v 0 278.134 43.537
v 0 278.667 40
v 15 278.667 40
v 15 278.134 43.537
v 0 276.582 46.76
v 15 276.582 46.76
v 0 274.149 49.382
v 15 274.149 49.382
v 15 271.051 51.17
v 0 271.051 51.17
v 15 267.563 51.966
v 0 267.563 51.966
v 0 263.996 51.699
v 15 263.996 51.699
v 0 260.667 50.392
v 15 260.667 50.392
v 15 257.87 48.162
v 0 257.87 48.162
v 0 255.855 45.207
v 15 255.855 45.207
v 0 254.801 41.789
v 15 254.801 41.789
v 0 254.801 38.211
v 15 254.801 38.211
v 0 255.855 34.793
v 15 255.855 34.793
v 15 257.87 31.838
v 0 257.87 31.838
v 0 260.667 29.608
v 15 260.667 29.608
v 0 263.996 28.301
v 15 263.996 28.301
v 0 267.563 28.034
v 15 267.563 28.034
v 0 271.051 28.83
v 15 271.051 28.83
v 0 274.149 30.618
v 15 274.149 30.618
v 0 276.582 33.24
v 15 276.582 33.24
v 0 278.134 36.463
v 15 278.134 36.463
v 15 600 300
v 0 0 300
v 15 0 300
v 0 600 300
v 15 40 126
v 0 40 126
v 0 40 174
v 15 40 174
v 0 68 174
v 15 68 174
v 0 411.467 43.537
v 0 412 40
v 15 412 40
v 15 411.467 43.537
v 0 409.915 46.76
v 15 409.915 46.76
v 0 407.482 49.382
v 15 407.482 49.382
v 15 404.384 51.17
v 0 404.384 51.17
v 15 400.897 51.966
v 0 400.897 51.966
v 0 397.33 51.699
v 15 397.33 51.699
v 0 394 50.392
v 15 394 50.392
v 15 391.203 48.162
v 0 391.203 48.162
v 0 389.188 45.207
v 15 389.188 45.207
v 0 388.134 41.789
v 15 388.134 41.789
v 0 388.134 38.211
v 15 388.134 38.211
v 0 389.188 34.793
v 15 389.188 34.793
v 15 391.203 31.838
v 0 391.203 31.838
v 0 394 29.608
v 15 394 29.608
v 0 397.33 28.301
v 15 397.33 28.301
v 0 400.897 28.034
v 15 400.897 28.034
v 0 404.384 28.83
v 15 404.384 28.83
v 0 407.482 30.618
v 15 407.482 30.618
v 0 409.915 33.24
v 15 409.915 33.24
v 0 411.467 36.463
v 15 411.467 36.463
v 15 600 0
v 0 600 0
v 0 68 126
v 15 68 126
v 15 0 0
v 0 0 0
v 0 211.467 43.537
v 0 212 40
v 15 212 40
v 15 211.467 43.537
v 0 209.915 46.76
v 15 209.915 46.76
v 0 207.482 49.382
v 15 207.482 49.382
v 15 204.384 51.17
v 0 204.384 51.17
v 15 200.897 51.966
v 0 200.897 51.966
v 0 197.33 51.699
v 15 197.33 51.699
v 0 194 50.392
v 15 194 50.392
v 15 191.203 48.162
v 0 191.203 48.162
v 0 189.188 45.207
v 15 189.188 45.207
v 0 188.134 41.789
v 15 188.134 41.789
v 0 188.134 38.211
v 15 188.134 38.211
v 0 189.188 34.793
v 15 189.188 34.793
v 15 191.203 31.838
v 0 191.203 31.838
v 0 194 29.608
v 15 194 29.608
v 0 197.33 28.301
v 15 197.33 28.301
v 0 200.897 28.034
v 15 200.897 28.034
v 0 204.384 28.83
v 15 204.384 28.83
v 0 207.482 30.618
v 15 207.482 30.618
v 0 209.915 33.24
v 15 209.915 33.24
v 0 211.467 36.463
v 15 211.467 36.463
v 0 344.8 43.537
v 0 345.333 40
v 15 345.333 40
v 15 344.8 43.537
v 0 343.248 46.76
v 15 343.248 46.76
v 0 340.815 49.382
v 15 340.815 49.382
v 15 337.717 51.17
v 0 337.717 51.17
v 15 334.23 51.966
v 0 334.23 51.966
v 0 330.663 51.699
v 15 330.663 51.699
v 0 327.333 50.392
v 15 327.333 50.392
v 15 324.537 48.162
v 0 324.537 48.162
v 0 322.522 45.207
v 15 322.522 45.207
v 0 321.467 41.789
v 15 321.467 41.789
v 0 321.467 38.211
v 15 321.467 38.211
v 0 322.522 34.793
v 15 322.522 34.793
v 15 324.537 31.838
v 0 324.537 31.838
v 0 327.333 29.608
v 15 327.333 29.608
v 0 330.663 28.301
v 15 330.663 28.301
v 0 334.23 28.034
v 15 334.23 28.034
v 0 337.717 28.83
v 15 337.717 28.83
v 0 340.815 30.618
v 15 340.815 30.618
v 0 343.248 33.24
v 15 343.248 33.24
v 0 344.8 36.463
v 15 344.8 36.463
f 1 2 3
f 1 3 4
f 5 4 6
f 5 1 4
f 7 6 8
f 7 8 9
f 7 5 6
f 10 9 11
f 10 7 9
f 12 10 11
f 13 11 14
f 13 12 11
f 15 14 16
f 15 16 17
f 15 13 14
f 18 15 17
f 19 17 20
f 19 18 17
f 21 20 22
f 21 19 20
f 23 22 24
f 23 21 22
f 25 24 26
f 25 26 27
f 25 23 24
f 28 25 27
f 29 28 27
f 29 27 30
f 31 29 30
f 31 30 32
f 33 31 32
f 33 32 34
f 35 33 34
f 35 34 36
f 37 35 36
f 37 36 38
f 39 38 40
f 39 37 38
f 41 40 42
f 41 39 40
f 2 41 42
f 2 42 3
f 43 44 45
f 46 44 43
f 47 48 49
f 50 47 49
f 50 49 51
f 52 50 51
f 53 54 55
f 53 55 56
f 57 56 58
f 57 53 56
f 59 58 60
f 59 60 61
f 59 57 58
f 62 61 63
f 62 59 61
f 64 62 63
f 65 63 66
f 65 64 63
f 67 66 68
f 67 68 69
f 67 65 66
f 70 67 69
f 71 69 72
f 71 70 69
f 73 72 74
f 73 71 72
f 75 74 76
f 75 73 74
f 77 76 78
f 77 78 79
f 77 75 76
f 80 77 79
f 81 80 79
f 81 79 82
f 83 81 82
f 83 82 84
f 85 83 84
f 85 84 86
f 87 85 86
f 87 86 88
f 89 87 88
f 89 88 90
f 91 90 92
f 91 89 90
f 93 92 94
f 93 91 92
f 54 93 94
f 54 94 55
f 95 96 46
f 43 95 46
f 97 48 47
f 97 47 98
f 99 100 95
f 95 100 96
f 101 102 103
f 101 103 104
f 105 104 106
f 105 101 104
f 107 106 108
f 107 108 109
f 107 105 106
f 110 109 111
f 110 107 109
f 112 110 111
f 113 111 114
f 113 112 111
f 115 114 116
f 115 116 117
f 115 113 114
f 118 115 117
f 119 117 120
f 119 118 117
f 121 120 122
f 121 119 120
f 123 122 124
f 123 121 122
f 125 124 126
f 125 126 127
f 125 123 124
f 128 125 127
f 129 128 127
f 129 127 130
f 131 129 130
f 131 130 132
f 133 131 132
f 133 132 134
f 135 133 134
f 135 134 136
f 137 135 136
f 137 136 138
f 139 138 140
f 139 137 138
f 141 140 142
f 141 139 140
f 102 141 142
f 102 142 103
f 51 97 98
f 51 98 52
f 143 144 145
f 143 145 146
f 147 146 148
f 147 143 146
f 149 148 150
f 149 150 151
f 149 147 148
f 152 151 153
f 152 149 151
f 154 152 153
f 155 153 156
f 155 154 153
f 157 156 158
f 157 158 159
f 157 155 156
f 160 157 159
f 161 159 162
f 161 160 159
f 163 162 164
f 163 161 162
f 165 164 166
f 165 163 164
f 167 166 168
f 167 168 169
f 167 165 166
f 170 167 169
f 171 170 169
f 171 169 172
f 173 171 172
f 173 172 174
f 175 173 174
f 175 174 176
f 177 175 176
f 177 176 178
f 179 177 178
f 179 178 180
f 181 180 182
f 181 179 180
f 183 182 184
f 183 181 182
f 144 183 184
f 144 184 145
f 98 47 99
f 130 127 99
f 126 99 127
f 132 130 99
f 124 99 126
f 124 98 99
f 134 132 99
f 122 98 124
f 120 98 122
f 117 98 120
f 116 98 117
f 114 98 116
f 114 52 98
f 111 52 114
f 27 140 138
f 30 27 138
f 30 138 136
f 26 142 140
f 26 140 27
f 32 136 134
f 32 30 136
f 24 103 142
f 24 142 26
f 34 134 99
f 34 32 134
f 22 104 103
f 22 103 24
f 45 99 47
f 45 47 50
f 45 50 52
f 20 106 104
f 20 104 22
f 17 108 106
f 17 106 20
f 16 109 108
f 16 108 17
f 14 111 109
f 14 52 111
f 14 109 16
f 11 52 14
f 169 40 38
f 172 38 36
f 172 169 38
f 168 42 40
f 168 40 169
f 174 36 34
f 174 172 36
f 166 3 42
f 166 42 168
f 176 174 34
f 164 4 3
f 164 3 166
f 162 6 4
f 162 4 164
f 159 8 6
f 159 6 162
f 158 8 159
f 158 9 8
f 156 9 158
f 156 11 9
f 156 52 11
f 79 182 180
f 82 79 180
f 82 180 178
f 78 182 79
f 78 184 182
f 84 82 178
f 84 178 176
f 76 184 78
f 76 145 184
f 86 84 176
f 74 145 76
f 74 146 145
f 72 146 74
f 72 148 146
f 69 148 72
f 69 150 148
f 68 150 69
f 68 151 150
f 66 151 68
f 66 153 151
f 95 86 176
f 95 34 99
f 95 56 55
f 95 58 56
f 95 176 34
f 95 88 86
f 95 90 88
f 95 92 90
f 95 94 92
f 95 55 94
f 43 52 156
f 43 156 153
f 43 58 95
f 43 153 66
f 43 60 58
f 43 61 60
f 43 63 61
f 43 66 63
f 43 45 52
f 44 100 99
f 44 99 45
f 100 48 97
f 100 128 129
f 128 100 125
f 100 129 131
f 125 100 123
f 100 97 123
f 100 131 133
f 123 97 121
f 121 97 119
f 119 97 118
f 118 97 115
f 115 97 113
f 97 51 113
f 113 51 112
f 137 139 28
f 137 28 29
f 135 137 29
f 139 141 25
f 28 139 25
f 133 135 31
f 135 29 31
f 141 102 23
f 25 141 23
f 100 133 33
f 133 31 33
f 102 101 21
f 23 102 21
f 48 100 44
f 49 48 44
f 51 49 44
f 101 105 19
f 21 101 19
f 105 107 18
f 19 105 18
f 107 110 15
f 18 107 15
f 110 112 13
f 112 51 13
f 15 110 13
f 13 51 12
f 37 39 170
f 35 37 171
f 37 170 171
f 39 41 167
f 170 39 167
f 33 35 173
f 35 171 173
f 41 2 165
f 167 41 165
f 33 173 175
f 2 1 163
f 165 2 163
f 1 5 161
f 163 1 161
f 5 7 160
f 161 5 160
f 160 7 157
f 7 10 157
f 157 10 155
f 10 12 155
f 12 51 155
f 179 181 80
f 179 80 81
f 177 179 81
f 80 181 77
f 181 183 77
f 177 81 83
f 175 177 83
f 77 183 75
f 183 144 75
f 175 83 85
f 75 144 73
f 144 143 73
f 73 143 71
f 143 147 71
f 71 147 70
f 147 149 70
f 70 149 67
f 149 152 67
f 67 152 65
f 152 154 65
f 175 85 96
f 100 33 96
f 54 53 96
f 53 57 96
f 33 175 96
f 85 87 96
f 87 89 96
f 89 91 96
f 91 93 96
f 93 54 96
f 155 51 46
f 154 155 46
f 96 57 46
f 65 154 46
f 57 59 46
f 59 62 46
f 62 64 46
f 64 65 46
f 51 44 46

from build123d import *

# Parameters (mm, degrees)
SKETCH_W   = 600
SKETCH_H   = 300
SKETCH_R   = 12
SKETCH_W_2 = 28
SKETCH_H_2 = 48
PAD_DEPTH  = 15


with BuildPart() as part:
    # Sketch → Pad (new body)
    with BuildSketch(Plane.YZ):
        with Locations((300, 150)):
            Rectangle(SKETCH_W, SKETCH_H)
        with Locations((200, 40)):
            Circle(SKETCH_R, mode=Mode.SUBTRACT)
        with Locations((266.666667, 40)):
            Circle(SKETCH_R, mode=Mode.SUBTRACT)
        with Locations((333.333333, 40)):
            Circle(SKETCH_R, mode=Mode.SUBTRACT)
        with Locations((400, 40)):
            Circle(SKETCH_R, mode=Mode.SUBTRACT)
        with Locations((54, 150)):
            Rectangle(SKETCH_W_2, SKETCH_H_2, mode=Mode.SUBTRACT)
    extrude(amount=PAD_DEPTH)


solid = part.part
